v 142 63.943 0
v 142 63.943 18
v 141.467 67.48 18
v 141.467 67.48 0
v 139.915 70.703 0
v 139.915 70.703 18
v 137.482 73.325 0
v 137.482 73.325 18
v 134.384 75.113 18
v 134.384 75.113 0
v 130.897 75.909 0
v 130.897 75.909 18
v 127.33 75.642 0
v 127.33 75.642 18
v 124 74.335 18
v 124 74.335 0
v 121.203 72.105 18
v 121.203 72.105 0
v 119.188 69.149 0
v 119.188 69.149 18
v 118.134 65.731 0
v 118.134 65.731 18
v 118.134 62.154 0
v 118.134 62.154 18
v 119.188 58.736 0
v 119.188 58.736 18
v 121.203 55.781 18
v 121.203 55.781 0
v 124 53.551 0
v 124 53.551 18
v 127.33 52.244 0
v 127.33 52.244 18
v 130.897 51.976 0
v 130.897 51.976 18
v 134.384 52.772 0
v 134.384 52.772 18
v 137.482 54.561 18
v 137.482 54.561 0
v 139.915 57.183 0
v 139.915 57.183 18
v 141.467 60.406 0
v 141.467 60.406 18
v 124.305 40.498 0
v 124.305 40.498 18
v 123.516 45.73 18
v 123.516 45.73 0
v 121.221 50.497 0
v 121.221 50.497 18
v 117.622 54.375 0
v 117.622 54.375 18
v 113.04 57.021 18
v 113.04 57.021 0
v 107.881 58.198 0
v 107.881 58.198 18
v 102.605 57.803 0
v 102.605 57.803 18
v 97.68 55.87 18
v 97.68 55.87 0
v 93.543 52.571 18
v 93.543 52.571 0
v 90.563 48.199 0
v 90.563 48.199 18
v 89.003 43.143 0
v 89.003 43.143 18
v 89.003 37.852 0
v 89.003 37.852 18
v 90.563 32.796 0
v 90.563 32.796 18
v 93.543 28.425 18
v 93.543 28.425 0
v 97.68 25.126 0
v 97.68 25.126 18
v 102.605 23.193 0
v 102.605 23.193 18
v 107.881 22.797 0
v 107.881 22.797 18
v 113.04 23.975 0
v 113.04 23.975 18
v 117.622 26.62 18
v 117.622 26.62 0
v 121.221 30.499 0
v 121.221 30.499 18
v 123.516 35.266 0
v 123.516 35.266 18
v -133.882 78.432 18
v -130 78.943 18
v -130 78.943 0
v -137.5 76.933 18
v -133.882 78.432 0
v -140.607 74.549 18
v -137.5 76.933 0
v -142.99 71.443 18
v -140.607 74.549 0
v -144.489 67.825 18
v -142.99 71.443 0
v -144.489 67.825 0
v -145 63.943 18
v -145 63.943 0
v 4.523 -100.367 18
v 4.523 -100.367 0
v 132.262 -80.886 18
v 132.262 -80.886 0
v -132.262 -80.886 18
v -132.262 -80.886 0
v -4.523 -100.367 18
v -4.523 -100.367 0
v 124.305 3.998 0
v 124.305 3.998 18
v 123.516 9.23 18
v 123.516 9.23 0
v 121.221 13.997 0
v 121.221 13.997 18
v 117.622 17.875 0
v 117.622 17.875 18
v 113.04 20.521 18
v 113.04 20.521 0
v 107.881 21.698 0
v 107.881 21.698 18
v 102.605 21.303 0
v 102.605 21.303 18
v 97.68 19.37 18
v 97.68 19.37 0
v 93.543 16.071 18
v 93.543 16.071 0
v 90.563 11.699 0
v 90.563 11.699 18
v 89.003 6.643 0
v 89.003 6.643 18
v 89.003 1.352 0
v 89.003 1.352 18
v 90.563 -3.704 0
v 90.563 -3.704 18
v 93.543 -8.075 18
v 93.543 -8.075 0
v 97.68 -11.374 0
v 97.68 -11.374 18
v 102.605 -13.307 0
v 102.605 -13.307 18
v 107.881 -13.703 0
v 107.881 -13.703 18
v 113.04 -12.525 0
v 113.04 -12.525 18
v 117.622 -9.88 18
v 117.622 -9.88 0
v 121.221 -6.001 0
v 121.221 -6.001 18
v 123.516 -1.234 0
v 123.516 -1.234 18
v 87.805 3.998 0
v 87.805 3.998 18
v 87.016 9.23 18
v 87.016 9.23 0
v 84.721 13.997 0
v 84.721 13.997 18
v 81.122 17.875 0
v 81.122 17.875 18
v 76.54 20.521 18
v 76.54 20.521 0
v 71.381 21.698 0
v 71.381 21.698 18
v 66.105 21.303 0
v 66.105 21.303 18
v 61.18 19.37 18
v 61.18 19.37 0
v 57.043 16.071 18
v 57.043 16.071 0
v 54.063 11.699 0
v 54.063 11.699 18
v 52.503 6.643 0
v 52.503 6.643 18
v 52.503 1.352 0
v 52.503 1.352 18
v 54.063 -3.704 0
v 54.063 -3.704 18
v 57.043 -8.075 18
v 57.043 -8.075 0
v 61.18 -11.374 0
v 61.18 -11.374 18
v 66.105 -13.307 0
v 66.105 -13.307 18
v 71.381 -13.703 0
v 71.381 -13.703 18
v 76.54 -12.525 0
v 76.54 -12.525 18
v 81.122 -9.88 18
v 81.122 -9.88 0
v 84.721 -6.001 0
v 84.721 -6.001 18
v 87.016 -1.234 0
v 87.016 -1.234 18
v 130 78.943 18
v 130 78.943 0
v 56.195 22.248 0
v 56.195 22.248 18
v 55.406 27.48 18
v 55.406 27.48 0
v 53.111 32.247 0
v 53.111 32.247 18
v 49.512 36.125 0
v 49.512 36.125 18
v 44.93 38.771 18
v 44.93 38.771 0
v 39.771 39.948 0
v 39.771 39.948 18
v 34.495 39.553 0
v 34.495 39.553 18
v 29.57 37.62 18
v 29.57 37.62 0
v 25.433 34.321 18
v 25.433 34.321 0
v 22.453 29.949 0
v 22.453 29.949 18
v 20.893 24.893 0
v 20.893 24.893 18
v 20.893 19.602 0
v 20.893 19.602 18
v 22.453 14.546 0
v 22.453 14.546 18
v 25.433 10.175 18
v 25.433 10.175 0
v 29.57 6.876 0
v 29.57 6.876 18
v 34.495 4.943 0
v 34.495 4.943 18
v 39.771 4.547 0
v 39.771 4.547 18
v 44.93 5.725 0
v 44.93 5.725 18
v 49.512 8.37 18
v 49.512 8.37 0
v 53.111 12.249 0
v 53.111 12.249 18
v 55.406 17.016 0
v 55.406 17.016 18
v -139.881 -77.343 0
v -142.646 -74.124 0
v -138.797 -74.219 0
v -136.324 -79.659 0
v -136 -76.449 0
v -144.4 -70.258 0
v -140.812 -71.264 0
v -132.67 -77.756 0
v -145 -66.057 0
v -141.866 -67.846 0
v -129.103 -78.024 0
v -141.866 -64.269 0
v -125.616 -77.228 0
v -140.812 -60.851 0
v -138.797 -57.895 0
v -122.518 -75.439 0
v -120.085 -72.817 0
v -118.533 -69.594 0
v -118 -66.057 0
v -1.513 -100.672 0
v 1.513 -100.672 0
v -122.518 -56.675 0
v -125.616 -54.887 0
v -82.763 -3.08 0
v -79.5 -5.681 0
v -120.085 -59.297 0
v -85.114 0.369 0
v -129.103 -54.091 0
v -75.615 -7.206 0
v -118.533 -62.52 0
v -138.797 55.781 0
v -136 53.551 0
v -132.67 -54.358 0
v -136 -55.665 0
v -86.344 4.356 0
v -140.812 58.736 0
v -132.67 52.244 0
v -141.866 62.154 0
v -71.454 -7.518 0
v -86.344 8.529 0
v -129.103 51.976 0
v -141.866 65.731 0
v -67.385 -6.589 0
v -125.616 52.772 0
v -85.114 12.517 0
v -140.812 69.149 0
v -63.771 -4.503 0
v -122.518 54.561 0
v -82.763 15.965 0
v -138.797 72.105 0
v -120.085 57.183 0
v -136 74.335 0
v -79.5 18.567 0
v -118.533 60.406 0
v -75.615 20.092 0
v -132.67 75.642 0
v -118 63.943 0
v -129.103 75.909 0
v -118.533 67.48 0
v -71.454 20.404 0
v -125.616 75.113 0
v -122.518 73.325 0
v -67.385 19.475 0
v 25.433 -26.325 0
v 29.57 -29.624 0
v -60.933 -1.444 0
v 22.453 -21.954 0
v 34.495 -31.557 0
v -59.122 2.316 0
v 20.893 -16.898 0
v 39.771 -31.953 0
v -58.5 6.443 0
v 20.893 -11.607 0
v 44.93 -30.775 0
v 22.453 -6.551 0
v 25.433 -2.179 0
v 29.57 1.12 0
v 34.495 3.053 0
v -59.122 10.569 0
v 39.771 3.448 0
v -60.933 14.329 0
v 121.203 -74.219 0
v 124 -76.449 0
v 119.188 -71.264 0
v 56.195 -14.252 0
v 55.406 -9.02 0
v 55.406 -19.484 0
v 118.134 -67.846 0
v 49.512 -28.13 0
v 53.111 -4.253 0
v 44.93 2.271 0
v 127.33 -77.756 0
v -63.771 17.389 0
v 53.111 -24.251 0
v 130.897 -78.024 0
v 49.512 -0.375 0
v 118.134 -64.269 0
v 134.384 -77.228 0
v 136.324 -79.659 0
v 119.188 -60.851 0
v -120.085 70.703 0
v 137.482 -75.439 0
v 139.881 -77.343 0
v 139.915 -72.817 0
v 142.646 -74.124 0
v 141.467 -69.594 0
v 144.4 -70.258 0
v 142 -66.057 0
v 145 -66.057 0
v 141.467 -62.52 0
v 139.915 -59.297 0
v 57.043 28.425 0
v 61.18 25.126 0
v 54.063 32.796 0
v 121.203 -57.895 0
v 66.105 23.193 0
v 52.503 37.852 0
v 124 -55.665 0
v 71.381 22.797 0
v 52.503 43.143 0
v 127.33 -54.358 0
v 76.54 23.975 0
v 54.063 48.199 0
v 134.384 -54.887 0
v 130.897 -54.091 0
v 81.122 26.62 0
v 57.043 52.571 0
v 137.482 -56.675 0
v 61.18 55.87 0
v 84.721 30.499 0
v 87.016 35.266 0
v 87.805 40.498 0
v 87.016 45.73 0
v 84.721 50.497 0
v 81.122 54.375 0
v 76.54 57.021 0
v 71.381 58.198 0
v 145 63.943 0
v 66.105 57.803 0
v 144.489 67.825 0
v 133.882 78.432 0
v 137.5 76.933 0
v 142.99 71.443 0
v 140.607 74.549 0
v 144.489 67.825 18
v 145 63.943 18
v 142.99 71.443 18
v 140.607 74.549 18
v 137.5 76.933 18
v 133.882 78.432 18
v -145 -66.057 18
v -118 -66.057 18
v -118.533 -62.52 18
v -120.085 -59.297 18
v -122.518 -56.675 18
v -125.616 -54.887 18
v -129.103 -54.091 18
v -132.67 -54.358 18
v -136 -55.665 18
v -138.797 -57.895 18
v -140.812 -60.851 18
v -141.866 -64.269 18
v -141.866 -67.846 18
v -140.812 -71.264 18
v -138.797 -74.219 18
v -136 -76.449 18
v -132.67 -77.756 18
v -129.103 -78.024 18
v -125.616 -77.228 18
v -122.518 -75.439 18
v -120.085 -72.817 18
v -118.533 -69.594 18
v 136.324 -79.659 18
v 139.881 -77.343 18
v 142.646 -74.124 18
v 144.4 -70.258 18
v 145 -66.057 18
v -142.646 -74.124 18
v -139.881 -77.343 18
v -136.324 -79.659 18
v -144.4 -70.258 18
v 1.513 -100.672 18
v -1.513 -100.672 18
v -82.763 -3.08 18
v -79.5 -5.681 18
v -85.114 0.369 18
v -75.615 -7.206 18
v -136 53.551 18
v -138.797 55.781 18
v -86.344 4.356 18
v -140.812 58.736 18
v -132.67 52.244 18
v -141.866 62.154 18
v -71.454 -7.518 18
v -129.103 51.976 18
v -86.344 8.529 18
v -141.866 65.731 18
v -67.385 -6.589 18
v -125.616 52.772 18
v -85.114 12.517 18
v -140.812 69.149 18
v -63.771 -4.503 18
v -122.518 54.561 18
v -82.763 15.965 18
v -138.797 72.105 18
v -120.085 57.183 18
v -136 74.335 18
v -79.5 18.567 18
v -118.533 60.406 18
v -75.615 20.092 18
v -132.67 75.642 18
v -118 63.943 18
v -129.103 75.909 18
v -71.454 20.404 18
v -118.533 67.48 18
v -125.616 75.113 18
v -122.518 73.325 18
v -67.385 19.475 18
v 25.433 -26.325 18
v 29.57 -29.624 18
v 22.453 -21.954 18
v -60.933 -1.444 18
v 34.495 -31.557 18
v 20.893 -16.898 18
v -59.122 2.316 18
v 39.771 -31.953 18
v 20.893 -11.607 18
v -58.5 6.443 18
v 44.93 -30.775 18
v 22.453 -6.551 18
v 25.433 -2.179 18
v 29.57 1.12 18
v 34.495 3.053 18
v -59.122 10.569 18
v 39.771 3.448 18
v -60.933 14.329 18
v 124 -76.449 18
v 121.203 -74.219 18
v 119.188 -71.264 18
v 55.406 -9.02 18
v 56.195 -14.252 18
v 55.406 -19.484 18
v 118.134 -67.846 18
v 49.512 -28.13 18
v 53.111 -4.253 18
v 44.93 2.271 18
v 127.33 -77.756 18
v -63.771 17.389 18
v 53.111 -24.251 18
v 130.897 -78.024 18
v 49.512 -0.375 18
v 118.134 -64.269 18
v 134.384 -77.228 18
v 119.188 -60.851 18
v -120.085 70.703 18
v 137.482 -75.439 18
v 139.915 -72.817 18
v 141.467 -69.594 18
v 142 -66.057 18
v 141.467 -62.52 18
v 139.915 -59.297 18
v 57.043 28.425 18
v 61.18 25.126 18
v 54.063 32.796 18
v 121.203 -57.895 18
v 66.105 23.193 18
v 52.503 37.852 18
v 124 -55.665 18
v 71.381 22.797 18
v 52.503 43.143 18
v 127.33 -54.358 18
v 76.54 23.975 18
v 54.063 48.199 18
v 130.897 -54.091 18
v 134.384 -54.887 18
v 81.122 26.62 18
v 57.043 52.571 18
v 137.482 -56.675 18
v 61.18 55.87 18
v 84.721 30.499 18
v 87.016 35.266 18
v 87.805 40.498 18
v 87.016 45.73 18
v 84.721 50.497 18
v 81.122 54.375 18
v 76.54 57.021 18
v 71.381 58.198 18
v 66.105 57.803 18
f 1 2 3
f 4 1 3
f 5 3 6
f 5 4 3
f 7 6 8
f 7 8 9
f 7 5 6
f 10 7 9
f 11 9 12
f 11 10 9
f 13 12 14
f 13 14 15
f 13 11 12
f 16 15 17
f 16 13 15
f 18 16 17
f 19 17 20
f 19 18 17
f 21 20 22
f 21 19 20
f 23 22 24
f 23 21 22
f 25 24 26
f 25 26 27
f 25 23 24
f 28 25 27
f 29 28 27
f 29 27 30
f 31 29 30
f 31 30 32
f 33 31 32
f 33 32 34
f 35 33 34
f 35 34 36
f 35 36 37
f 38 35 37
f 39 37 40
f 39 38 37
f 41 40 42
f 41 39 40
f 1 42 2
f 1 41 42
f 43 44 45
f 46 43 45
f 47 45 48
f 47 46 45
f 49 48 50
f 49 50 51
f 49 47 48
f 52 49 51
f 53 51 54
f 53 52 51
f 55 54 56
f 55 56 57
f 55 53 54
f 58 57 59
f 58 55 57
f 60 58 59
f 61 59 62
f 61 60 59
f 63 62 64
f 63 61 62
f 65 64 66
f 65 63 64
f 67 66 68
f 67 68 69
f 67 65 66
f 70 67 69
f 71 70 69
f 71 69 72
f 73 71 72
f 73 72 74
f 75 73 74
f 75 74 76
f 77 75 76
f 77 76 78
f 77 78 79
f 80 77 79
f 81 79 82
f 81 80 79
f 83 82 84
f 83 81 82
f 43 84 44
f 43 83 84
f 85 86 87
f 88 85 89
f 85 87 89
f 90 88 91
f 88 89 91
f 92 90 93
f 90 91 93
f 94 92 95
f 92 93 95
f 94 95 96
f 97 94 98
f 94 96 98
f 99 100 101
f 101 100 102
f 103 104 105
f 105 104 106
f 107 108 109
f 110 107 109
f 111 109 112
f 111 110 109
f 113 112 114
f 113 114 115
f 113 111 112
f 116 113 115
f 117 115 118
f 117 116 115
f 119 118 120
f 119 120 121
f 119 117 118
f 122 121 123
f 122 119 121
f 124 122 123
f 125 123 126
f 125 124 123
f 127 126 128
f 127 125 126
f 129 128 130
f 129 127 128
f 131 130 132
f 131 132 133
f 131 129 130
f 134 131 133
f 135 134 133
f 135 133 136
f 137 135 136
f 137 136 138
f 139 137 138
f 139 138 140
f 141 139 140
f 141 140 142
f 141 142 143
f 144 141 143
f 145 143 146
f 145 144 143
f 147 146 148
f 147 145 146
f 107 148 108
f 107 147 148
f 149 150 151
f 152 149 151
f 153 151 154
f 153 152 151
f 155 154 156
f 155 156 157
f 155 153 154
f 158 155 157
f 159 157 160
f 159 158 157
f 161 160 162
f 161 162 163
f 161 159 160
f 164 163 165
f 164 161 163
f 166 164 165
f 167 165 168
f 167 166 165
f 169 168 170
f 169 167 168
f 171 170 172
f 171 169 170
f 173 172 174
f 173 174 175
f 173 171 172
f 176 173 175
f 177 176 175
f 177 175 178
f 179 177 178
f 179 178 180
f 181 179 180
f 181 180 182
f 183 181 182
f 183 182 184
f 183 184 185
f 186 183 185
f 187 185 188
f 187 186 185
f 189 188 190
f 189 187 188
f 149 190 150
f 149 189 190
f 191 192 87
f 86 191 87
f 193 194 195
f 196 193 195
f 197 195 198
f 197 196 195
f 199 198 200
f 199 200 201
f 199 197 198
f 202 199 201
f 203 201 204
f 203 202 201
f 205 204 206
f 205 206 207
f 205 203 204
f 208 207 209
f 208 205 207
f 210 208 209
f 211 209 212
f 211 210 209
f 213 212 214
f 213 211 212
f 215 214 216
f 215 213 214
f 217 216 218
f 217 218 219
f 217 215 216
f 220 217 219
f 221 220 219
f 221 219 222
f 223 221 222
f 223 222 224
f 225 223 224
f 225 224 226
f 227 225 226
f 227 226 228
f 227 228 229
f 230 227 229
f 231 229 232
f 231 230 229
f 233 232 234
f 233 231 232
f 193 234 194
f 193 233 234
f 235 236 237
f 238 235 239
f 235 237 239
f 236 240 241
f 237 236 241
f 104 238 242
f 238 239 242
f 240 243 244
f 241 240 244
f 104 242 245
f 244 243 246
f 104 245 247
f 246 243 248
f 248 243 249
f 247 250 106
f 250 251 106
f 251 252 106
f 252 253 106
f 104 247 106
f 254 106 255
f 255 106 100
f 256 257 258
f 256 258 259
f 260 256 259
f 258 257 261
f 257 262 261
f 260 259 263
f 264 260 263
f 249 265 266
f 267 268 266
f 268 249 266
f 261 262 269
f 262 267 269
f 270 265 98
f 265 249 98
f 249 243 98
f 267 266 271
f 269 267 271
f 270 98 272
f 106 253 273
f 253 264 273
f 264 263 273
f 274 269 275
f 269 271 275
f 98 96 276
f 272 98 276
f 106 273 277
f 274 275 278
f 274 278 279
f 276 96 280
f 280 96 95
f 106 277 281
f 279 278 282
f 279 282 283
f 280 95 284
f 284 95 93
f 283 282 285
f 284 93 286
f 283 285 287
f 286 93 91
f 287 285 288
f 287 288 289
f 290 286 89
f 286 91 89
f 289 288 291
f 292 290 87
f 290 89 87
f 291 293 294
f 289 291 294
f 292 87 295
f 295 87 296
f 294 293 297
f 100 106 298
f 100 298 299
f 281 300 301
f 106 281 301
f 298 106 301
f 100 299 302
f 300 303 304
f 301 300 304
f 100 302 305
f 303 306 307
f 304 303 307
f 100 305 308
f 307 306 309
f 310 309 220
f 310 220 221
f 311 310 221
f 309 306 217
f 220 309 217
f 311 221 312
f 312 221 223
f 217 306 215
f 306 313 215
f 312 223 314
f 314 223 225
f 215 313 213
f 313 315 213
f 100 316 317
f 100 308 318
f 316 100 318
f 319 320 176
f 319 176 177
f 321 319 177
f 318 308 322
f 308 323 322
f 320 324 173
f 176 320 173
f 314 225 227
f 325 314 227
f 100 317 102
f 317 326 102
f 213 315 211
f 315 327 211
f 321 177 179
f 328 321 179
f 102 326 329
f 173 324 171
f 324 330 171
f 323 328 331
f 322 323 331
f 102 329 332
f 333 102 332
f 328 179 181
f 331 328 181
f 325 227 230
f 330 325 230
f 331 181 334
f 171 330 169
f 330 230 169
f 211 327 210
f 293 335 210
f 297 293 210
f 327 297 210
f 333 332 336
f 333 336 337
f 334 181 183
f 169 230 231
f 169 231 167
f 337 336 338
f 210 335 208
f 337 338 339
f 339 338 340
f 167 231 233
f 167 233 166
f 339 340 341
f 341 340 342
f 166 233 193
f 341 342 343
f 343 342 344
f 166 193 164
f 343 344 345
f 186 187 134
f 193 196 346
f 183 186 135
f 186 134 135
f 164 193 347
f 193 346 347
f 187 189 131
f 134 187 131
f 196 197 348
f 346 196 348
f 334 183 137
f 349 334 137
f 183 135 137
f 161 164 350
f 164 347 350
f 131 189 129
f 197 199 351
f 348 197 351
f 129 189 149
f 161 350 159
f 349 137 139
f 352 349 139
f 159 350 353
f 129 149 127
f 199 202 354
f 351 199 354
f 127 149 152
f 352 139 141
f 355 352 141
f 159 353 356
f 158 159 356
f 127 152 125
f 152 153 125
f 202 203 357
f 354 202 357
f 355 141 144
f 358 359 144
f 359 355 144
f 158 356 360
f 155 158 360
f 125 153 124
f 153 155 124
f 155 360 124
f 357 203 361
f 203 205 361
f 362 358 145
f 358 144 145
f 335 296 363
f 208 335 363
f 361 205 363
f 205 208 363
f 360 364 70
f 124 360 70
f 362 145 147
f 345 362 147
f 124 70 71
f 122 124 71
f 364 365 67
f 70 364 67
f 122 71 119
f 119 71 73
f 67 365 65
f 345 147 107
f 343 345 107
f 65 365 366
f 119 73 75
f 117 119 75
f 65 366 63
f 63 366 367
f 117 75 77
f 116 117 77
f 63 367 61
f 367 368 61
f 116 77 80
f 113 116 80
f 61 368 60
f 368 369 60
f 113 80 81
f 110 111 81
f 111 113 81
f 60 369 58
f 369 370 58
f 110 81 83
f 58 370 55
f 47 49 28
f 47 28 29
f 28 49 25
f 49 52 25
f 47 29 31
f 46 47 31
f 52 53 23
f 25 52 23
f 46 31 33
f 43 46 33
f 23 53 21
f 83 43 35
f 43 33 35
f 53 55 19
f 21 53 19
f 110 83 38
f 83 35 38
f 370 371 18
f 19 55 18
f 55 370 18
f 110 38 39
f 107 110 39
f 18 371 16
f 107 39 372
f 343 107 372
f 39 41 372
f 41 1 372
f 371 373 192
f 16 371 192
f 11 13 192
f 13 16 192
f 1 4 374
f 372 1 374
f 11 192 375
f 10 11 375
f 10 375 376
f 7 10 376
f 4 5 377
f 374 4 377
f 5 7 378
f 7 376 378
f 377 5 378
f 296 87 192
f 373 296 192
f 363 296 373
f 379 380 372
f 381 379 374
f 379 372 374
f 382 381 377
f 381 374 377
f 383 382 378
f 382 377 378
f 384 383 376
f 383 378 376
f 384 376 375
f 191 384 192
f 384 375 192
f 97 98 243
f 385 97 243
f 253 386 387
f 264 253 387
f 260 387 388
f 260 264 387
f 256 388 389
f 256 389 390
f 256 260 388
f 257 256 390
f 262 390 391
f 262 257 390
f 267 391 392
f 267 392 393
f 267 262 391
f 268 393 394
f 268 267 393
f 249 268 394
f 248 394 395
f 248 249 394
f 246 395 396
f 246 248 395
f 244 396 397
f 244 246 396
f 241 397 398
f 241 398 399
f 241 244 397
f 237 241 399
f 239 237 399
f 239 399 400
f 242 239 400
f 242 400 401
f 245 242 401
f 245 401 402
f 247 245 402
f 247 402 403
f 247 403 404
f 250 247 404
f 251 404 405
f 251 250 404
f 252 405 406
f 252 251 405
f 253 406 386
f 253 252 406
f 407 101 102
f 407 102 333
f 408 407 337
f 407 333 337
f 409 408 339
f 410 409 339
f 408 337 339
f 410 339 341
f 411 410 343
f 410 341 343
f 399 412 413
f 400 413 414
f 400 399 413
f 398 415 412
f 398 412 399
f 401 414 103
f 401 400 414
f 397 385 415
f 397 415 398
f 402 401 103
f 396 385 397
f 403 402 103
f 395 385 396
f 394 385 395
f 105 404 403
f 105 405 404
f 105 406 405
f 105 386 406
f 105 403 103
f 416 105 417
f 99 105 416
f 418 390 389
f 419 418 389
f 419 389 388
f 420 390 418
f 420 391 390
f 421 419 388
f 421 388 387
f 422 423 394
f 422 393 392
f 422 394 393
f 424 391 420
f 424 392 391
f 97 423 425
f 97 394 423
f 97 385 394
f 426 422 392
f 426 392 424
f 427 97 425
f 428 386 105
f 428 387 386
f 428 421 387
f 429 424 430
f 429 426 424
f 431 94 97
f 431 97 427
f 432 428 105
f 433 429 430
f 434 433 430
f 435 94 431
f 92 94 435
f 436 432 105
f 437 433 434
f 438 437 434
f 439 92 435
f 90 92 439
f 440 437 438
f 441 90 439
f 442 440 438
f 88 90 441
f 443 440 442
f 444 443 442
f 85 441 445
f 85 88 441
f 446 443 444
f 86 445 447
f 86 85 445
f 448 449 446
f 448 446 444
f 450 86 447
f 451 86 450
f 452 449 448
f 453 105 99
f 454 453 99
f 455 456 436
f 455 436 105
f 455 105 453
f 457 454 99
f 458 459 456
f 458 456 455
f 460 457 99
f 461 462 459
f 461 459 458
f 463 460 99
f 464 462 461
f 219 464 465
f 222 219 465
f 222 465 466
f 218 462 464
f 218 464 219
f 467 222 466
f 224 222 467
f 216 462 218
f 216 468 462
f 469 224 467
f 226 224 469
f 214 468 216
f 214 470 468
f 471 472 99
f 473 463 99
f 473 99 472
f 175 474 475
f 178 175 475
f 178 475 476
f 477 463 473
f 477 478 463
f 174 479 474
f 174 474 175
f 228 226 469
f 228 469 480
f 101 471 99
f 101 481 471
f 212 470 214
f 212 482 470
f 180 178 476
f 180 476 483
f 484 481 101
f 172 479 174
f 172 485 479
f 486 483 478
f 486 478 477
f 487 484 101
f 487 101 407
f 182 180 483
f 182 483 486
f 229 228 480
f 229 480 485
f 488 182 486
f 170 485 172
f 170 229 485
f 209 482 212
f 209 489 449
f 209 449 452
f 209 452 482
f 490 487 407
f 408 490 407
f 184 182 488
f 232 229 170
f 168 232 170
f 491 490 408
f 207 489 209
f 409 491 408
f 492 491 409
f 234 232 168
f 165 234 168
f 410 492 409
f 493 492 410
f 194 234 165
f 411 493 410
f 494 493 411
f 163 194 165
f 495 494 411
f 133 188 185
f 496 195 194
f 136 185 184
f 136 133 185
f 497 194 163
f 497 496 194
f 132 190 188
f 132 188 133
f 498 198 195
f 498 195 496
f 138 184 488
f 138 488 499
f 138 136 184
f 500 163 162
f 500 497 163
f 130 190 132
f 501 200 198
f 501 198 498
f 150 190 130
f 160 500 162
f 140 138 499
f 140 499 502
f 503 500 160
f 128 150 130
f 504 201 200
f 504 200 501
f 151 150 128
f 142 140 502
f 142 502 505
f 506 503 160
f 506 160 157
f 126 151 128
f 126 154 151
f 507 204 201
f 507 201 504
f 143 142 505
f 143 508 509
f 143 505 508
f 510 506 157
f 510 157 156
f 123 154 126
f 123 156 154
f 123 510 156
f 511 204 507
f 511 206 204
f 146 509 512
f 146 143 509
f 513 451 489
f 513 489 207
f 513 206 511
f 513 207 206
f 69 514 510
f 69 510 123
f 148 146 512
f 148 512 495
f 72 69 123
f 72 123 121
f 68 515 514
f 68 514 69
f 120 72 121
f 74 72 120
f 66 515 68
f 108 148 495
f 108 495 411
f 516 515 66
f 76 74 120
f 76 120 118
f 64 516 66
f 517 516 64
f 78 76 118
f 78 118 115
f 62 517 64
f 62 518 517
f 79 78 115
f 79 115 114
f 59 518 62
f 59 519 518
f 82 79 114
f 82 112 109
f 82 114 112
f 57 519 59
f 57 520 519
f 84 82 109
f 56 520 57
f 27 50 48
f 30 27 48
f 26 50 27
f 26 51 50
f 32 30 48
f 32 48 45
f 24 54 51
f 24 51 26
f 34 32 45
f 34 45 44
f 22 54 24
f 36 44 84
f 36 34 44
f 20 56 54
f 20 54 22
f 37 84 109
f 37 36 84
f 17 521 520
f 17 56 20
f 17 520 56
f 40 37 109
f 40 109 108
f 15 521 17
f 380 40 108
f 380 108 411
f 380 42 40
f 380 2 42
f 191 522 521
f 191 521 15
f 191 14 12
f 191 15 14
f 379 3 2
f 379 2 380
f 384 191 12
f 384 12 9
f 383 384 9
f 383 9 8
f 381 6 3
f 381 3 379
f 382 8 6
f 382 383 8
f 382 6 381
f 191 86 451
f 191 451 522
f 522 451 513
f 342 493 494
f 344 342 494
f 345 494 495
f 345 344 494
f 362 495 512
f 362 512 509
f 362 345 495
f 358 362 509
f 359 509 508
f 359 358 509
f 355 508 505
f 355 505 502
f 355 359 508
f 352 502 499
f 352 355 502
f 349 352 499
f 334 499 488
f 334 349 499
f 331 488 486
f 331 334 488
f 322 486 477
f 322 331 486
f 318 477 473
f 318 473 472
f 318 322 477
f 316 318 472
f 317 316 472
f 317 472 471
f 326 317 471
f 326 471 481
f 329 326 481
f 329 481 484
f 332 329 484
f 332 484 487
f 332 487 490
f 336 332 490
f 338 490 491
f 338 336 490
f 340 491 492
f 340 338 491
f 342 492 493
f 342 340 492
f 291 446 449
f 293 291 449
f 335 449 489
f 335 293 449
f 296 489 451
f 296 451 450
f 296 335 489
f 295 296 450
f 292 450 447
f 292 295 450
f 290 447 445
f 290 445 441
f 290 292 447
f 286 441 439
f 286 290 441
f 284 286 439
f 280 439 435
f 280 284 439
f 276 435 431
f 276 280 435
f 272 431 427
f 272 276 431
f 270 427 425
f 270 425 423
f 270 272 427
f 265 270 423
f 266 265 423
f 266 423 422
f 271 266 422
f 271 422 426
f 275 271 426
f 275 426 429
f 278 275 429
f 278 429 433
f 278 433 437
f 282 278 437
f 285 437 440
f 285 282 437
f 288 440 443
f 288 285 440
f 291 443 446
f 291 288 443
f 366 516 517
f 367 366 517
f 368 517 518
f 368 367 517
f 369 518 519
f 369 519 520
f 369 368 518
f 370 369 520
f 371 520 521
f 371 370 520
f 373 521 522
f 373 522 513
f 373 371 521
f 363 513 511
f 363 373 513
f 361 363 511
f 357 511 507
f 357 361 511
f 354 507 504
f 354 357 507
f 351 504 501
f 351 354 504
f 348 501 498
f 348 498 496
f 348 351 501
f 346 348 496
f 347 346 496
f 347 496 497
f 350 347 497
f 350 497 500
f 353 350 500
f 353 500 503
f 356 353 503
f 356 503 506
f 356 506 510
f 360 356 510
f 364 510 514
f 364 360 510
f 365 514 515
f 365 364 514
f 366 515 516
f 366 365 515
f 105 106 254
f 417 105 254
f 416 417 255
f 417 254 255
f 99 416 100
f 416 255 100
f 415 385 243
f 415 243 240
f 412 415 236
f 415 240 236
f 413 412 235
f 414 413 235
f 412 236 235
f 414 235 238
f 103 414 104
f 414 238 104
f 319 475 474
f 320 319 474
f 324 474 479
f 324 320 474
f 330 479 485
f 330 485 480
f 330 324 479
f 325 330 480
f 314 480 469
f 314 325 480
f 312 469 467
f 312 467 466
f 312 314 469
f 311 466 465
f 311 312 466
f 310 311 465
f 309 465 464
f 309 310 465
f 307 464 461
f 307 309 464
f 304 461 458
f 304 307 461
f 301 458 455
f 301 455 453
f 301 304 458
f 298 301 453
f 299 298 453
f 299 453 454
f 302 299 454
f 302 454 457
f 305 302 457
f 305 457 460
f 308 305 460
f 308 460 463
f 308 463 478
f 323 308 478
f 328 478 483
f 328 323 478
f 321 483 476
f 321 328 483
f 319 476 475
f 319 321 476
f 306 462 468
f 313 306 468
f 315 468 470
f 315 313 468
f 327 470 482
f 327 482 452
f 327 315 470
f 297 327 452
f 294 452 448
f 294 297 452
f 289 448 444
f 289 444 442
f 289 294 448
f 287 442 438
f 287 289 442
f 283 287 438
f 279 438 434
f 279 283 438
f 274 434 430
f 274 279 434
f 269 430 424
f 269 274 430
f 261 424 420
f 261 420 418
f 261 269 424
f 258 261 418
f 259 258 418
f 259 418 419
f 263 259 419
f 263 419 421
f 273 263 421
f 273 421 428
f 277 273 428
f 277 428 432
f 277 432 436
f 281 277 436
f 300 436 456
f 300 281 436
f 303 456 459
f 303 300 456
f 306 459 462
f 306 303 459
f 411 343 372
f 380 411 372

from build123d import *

# Parameters (mm, degrees)
F0_R     = 12
F0_R_2   = 17.75
F0_R_3   = 14
F1_DEPTH = 18


with BuildPart() as f1:
    # F0 (on Top) → F1 (new body)
    with BuildSketch(Plane.XY):
        with BuildLine():
            ThreePointArc((145, 63.942884), (140.606602, 74.549485), (130, 78.942884))
            Line((130, 78.942884), (-130, 78.942884))
            ThreePointArc((-130, 78.942884), (-140.606602, 74.549485), (-145, 63.942884))
            Line((-145, 63.942884), (-145, -66.057116))
            ThreePointArc((-145, -66.057116), (-141.378114, -75.831498), (-132.261529, -80.885653))
            Line((-132.261529, -80.885653), (-4.523058, -100.367296))
            ThreePointArc((-4.523058, -100.367296), (0, -100.710224), (4.523058, -100.367296))
            Line((4.523058, -100.367296), (132.261529, -80.885653))
            ThreePointArc((132.261529, -80.885653), (141.378114, -75.831498), (145, -66.057116))
            Line((145, -66.057116), (145, 63.942884))
        make_face()
        with Locations((-130, -66.057116)):
            Circle(F0_R, mode=Mode.SUBTRACT)
        with Locations((130, -66.057116)):
            Circle(F0_R, mode=Mode.SUBTRACT)
        with Locations((38.445036, -14.252153)):
            Circle(F0_R_2, mode=Mode.SUBTRACT)
        with Locations((-72.5, 6.442884)):
            Circle(F0_R_3, mode=Mode.SUBTRACT)
        with Locations((-130, 63.942884)):
            Circle(F0_R, mode=Mode.SUBTRACT)
        with Locations((70.054964, 3.997847)):
            Circle(F0_R_2, mode=Mode.SUBTRACT)
        with Locations((38.445036, 22.247847)):
            Circle(F0_R_2, mode=Mode.SUBTRACT)
        with Locations((106.554964, 3.997847)):
            Circle(F0_R_2, mode=Mode.SUBTRACT)
        with Locations((70.054964, 40.497847)):
            Circle(F0_R_2, mode=Mode.SUBTRACT)
        with Locations((106.554964, 40.497847)):
            Circle(F0_R_2, mode=Mode.SUBTRACT)
        with Locations((130, 63.942884)):
            Circle(F0_R, mode=Mode.SUBTRACT)
    extrude(amount=F1_DEPTH)


solid = f1.part
